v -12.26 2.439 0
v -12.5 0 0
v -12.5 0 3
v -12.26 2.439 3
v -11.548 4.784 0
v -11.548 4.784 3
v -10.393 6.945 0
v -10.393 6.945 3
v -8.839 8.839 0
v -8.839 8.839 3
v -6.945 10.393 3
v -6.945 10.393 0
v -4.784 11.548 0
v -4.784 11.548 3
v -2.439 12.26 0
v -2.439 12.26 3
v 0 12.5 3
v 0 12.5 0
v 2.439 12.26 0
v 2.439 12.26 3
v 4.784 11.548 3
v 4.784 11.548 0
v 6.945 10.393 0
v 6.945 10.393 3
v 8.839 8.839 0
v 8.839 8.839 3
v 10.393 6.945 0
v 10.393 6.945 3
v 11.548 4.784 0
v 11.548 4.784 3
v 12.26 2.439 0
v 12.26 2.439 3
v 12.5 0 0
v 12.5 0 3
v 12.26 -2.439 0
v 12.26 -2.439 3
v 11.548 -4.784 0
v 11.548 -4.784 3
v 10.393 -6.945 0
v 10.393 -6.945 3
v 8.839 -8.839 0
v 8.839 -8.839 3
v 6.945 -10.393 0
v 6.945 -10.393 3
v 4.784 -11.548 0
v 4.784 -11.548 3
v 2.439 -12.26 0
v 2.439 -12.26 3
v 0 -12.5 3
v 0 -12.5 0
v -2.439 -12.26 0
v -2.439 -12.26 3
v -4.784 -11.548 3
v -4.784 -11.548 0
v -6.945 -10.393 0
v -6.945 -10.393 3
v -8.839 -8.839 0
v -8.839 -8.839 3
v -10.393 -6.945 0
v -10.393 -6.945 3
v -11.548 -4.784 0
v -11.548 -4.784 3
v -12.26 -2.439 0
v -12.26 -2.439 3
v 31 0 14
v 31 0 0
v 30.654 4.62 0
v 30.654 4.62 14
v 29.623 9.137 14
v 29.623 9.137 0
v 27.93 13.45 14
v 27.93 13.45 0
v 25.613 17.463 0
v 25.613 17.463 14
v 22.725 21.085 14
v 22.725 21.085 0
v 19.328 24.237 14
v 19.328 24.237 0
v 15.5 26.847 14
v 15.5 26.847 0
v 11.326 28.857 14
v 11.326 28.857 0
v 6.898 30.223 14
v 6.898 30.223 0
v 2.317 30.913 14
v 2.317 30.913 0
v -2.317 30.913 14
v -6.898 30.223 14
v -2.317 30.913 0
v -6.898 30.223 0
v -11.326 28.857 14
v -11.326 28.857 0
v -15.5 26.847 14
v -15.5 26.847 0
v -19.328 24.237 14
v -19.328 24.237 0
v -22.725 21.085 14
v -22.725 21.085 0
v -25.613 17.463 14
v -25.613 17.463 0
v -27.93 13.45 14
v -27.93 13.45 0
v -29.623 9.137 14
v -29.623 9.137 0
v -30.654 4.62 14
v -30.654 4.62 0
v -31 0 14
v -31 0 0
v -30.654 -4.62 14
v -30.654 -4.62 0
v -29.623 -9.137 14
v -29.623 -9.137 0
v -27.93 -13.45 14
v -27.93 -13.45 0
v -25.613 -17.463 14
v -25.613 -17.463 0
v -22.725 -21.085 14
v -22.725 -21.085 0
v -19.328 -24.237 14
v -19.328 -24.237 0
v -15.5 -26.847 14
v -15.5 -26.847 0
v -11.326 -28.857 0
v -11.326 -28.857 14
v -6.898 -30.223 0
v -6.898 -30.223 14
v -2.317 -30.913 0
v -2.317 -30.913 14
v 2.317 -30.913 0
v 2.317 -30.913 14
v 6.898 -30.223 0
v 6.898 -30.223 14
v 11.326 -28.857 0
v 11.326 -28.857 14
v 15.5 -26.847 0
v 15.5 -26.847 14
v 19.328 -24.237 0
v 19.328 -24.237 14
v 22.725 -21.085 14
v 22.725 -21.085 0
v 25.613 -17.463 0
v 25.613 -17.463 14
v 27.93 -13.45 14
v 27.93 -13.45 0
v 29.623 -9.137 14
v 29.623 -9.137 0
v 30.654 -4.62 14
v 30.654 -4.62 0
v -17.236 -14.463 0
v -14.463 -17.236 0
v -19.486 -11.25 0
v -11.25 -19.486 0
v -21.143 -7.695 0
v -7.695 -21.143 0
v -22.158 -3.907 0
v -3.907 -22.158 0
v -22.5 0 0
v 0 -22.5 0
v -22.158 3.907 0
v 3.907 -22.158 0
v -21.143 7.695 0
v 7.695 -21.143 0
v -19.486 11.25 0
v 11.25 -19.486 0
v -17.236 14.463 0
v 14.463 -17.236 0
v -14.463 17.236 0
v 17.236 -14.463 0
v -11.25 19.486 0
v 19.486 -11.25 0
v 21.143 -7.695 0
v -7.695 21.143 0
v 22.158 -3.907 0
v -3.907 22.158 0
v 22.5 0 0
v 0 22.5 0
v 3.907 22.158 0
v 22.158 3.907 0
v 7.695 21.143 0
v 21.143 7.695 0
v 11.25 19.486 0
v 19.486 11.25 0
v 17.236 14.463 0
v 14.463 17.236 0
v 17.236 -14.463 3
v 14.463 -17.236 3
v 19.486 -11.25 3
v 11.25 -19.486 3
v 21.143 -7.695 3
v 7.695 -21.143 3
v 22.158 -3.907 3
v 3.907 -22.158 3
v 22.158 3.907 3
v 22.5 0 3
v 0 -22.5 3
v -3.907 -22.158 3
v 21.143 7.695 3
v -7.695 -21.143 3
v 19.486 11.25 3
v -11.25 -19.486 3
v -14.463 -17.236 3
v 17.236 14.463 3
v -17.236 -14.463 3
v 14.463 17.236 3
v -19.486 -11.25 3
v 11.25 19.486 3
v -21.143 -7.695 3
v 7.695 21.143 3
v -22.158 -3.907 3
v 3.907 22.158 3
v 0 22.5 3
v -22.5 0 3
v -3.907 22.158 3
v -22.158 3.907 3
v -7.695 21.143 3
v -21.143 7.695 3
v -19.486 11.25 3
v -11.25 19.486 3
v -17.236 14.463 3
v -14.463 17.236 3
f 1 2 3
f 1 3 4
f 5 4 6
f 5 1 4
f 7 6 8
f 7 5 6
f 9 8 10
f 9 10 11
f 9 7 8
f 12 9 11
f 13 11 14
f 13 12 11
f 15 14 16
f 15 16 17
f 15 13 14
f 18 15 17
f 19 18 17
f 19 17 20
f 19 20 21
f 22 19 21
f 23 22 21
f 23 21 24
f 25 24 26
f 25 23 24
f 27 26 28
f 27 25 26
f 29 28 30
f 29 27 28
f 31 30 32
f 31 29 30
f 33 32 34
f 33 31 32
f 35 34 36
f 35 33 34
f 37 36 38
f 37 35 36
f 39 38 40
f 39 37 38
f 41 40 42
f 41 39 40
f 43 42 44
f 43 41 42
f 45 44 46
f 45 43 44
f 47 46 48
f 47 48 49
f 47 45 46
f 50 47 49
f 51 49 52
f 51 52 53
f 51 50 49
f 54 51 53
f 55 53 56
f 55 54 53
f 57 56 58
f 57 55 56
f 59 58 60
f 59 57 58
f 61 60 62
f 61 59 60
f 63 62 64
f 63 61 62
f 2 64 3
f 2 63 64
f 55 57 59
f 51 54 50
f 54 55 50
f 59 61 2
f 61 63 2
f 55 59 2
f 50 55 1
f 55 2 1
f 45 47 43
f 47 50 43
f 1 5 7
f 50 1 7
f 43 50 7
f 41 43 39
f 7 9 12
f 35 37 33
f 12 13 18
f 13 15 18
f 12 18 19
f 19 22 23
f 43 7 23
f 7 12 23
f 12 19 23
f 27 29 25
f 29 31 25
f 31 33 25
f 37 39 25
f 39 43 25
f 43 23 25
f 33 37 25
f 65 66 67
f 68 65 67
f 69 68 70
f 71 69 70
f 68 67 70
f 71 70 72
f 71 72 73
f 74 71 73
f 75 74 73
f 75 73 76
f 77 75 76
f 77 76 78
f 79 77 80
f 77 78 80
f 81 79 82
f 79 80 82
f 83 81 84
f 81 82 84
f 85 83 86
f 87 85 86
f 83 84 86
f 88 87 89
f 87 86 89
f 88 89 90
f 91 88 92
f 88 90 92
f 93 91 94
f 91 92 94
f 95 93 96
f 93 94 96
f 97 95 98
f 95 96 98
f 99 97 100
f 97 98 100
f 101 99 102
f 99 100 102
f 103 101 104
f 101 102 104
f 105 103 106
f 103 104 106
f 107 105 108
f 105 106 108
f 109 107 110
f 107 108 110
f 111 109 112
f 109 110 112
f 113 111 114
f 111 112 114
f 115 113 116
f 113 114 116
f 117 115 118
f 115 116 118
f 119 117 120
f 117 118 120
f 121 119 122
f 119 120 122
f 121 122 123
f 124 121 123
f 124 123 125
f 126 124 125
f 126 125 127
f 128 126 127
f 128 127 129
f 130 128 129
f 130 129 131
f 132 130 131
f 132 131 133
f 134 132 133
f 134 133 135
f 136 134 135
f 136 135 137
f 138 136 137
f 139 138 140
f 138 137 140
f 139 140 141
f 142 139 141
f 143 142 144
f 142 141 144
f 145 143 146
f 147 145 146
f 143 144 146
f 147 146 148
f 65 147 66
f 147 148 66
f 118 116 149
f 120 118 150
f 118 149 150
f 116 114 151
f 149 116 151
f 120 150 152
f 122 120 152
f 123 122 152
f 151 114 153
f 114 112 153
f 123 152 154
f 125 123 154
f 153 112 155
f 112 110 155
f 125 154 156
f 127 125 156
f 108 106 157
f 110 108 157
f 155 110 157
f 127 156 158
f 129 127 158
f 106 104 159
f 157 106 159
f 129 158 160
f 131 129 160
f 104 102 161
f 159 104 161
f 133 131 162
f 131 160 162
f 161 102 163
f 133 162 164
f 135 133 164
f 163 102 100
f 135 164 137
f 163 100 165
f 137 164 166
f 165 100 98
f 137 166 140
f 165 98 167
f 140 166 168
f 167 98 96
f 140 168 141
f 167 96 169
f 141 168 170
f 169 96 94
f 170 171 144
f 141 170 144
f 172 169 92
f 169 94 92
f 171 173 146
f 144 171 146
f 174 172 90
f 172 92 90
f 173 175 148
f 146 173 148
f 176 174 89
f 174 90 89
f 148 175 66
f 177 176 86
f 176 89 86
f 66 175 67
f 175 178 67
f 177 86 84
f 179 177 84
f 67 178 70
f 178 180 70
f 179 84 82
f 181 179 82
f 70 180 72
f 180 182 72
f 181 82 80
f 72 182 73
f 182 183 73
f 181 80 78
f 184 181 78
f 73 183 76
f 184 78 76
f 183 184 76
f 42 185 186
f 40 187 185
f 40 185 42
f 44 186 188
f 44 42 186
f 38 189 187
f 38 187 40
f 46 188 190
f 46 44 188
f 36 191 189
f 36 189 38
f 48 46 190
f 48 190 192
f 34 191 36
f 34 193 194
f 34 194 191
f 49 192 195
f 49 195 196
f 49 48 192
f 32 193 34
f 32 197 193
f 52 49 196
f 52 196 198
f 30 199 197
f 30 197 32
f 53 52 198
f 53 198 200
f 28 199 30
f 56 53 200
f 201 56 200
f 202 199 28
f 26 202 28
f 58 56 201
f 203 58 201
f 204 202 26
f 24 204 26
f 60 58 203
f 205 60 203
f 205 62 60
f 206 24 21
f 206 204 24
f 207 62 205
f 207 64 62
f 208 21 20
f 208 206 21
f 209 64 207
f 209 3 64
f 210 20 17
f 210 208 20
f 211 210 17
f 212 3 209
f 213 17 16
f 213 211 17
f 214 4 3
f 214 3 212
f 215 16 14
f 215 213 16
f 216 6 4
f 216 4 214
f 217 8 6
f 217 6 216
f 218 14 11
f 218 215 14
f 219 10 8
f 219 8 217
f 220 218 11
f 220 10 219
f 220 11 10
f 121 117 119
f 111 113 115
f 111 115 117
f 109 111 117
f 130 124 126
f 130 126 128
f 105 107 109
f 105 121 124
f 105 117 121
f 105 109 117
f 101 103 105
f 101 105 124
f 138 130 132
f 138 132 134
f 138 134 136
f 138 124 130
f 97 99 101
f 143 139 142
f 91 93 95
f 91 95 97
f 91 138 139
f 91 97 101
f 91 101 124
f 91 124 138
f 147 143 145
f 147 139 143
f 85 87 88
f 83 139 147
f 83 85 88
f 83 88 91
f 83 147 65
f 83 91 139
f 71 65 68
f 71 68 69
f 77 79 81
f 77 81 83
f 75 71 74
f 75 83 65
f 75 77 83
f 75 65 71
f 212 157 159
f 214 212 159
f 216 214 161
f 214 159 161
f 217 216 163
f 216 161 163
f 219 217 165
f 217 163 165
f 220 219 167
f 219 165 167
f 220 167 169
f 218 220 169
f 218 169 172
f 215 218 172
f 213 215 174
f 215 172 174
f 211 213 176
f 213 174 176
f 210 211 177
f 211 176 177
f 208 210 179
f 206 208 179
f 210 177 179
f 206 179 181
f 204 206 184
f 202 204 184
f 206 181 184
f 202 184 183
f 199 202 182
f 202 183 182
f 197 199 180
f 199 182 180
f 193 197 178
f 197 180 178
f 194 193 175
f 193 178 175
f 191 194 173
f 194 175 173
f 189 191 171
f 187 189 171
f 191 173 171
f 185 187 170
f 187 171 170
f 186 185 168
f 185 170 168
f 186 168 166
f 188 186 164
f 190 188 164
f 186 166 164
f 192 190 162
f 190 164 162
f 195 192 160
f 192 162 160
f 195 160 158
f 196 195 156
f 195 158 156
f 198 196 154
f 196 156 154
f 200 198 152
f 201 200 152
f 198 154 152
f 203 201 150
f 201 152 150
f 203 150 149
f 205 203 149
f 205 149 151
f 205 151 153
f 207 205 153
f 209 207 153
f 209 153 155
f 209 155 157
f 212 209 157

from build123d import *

# Parameters (mm, degrees)
ESQUISSE1_R             = 31
BOSS_EXTRU_1_DEPTH      = 14
ESQUISSE2_R             = 22.5
ESQUISSE2_R_2           = 12.5
ENL_V_MAT_EXTRU_1_DEPTH = 3


with BuildPart() as part:
    # Esquisse1 → Boss.-Extru.1 (new body)
    with BuildSketch(Plane.XY):
        Circle(ESQUISSE1_R)
    extrude(amount=BOSS_EXTRU_1_DEPTH)

    # Esquisse2 → Enlèv. mat.-Extru.1 (cut)
    with BuildSketch(Plane(origin=(0, 0, 0), x_dir=(-1, 0, 0), z_dir=(0, 0, -1))):
        Circle(ESQUISSE2_R)
        Circle(ESQUISSE2_R_2, mode=Mode.SUBTRACT)
    extrude(amount=-ENL_V_MAT_EXTRU_1_DEPTH, mode=Mode.SUBTRACT)


solid = part.part
